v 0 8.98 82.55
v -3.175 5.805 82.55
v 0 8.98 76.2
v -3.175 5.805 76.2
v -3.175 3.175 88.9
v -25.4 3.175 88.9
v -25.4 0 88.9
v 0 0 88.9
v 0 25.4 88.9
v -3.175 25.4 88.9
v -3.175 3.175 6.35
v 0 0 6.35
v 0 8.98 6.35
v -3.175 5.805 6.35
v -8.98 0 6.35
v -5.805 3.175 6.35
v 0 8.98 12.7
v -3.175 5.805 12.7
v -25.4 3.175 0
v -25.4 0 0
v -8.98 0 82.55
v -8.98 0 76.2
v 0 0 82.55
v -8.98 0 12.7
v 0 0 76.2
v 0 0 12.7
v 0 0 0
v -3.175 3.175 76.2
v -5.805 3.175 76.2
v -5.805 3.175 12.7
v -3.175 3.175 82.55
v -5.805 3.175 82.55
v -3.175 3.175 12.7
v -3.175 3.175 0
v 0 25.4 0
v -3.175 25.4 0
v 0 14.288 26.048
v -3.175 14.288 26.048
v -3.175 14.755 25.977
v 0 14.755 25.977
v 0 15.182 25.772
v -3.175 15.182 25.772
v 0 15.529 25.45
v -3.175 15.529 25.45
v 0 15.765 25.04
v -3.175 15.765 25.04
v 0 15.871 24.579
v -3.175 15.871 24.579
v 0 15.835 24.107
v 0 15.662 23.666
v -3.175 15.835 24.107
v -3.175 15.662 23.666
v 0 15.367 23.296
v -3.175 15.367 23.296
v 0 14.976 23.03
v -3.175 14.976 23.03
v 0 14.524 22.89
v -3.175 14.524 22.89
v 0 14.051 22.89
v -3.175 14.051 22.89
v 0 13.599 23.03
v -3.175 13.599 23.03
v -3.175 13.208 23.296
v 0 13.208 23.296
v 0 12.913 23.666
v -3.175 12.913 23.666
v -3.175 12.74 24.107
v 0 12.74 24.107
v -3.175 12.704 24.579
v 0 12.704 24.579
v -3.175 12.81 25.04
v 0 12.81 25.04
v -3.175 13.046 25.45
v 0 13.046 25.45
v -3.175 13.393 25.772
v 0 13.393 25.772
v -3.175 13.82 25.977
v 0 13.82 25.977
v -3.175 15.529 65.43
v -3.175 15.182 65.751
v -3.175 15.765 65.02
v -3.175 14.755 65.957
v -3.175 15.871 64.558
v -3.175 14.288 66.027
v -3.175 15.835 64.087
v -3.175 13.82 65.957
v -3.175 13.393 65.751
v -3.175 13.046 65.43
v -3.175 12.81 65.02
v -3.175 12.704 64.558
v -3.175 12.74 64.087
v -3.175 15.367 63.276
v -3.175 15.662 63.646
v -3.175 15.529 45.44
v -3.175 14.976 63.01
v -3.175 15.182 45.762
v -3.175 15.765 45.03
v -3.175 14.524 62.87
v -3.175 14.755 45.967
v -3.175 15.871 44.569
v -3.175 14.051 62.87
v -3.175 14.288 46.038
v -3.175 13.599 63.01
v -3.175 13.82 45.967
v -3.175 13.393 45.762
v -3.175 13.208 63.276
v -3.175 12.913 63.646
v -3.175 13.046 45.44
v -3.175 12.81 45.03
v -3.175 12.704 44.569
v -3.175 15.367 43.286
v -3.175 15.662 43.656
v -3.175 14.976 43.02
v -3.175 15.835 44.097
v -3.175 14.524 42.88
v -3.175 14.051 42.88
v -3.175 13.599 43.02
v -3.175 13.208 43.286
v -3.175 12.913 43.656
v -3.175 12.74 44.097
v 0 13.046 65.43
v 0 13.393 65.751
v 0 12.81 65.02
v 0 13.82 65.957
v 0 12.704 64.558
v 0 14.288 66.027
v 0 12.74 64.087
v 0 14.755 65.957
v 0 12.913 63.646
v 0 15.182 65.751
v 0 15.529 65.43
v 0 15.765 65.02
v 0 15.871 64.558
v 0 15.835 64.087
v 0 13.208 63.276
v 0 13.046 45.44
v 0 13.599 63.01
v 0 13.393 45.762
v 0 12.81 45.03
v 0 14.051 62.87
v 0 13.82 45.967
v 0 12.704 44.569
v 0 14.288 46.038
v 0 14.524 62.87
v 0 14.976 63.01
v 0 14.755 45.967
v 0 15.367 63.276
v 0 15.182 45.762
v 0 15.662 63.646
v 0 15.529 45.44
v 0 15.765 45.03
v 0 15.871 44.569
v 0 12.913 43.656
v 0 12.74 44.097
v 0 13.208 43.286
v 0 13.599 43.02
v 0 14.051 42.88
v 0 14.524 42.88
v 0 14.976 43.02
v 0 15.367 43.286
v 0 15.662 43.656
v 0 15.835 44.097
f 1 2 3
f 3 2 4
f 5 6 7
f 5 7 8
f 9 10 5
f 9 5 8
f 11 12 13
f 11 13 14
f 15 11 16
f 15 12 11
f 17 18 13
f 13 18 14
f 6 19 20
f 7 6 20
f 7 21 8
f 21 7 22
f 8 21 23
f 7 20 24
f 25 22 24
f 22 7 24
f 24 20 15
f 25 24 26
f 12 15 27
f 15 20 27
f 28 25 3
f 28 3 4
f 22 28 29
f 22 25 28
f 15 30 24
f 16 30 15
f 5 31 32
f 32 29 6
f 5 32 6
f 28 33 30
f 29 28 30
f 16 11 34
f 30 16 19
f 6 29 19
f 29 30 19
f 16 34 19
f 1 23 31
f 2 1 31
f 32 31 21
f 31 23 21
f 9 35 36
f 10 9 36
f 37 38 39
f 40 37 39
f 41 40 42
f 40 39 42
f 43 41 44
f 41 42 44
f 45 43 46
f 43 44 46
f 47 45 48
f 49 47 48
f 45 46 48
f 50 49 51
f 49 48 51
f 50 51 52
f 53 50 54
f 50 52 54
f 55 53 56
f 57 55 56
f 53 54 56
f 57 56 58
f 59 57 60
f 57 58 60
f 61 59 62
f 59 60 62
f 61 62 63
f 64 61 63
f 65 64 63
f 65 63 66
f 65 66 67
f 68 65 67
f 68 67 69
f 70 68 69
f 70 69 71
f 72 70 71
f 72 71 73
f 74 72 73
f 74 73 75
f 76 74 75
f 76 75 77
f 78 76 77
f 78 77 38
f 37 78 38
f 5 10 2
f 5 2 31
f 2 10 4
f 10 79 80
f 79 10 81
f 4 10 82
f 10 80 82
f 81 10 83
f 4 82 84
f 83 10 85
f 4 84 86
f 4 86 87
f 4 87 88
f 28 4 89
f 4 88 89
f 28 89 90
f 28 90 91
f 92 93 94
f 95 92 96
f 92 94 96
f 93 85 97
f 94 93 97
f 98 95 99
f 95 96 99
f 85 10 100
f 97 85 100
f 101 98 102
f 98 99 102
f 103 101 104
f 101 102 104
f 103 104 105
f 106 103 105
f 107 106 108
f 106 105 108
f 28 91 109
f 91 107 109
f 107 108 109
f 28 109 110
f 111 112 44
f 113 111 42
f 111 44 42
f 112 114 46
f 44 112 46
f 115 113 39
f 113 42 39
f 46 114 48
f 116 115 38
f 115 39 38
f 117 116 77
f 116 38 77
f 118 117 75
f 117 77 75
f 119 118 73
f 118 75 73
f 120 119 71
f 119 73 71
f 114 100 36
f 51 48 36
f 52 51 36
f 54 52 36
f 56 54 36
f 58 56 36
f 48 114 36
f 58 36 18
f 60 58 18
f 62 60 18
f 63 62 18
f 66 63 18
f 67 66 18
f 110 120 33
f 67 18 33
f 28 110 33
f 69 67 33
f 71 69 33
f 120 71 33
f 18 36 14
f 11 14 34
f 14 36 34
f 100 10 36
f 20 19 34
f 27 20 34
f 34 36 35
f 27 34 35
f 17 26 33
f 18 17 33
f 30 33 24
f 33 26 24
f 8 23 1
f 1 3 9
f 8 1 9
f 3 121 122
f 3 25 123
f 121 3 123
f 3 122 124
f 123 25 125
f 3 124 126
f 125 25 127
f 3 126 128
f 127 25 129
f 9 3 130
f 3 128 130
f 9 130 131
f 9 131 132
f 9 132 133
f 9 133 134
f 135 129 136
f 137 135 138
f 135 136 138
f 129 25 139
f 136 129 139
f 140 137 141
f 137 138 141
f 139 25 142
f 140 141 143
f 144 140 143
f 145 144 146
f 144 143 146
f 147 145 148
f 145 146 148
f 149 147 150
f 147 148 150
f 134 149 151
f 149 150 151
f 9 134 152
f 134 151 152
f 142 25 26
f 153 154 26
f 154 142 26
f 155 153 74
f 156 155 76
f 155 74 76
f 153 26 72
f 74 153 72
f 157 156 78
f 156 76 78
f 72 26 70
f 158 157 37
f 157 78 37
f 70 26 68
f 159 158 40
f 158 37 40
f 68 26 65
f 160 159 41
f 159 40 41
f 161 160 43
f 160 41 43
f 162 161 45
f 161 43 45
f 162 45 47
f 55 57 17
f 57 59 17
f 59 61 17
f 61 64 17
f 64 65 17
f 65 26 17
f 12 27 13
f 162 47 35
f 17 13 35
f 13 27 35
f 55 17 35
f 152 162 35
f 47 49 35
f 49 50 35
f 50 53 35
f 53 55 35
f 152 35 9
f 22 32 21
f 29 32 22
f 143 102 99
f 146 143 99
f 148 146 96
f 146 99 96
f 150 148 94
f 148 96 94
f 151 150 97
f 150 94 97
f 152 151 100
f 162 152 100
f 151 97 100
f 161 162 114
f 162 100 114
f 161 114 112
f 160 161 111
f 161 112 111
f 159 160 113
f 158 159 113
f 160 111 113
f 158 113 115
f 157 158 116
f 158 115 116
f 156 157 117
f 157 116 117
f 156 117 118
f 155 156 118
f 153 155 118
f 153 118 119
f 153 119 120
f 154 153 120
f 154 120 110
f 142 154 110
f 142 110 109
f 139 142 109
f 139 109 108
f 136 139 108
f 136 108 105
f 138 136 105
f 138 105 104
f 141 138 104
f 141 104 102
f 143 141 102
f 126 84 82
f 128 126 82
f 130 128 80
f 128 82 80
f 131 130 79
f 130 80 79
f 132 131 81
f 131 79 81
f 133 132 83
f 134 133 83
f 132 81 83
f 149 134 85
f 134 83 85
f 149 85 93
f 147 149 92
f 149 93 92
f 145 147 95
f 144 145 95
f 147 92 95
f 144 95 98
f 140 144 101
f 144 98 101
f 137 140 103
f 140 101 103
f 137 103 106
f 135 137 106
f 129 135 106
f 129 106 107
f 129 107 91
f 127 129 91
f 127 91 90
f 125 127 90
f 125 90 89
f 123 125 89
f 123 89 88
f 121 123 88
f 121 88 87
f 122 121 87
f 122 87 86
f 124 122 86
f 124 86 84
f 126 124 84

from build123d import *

# Parameters (mm, degrees)
BOSS_EXTRUDE1_DEPTH     = 88.9
SKETCH2_W               = 6.35
SKETCH2_H               = 6.35
CUT_EXTRUDE4_DEPTH      = 18.960512242
CUT_EXTRUDE4_DEPTH_BACK = 18.960512242
SKETCH3_R               = 1.5875
CUT_EXTRUDE5_DEPTH      = 4.175


with BuildPart() as part:
    # Sketch1 → Boss-Extrude1 (new body)
    with BuildSketch(Plane.XY):
        Polygon((0, 0), (0, 25.4), (-3.175, 25.4), (-3.175, 3.175), (-25.4, 3.175), (-25.4, 0), align=None)
    extrude(amount=BOSS_EXTRUDE1_DEPTH)

    # Sketch2 → Cut-Extrude4 (cut, two sides)
    with BuildSketch(Plane(origin=(0, 0, 0), x_dir=(0, 0, -1), z_dir=(0.707106781, 0.707106781, 0))) as cut_extrude4_sk:
        with Locations((-79.375, 3.175)):
            Rectangle(SKETCH2_W, SKETCH2_H)
        with Locations((-9.525, 3.175)):
            Rectangle(SKETCH2_W, SKETCH2_H)
    extrude(amount=CUT_EXTRUDE4_DEPTH, mode=Mode.SUBTRACT)
    extrude(cut_extrude4_sk.sketch, amount=-CUT_EXTRUDE4_DEPTH_BACK, mode=Mode.SUBTRACT)

    # Sketch3 → Cut-Extrude5 (cut, through all)
    with BuildSketch(Plane.ZY.offset(3.175)):
        with Locations((44.45, 14.2875)):
            Circle(SKETCH3_R)
        with Locations((24.4602, 14.2875)):
            Circle(SKETCH3_R)
        with Locations((64.4398, 14.2875)):
            Circle(SKETCH3_R)
    extrude(amount=-CUT_EXTRUDE5_DEPTH, mode=Mode.SUBTRACT)


solid = part.part
